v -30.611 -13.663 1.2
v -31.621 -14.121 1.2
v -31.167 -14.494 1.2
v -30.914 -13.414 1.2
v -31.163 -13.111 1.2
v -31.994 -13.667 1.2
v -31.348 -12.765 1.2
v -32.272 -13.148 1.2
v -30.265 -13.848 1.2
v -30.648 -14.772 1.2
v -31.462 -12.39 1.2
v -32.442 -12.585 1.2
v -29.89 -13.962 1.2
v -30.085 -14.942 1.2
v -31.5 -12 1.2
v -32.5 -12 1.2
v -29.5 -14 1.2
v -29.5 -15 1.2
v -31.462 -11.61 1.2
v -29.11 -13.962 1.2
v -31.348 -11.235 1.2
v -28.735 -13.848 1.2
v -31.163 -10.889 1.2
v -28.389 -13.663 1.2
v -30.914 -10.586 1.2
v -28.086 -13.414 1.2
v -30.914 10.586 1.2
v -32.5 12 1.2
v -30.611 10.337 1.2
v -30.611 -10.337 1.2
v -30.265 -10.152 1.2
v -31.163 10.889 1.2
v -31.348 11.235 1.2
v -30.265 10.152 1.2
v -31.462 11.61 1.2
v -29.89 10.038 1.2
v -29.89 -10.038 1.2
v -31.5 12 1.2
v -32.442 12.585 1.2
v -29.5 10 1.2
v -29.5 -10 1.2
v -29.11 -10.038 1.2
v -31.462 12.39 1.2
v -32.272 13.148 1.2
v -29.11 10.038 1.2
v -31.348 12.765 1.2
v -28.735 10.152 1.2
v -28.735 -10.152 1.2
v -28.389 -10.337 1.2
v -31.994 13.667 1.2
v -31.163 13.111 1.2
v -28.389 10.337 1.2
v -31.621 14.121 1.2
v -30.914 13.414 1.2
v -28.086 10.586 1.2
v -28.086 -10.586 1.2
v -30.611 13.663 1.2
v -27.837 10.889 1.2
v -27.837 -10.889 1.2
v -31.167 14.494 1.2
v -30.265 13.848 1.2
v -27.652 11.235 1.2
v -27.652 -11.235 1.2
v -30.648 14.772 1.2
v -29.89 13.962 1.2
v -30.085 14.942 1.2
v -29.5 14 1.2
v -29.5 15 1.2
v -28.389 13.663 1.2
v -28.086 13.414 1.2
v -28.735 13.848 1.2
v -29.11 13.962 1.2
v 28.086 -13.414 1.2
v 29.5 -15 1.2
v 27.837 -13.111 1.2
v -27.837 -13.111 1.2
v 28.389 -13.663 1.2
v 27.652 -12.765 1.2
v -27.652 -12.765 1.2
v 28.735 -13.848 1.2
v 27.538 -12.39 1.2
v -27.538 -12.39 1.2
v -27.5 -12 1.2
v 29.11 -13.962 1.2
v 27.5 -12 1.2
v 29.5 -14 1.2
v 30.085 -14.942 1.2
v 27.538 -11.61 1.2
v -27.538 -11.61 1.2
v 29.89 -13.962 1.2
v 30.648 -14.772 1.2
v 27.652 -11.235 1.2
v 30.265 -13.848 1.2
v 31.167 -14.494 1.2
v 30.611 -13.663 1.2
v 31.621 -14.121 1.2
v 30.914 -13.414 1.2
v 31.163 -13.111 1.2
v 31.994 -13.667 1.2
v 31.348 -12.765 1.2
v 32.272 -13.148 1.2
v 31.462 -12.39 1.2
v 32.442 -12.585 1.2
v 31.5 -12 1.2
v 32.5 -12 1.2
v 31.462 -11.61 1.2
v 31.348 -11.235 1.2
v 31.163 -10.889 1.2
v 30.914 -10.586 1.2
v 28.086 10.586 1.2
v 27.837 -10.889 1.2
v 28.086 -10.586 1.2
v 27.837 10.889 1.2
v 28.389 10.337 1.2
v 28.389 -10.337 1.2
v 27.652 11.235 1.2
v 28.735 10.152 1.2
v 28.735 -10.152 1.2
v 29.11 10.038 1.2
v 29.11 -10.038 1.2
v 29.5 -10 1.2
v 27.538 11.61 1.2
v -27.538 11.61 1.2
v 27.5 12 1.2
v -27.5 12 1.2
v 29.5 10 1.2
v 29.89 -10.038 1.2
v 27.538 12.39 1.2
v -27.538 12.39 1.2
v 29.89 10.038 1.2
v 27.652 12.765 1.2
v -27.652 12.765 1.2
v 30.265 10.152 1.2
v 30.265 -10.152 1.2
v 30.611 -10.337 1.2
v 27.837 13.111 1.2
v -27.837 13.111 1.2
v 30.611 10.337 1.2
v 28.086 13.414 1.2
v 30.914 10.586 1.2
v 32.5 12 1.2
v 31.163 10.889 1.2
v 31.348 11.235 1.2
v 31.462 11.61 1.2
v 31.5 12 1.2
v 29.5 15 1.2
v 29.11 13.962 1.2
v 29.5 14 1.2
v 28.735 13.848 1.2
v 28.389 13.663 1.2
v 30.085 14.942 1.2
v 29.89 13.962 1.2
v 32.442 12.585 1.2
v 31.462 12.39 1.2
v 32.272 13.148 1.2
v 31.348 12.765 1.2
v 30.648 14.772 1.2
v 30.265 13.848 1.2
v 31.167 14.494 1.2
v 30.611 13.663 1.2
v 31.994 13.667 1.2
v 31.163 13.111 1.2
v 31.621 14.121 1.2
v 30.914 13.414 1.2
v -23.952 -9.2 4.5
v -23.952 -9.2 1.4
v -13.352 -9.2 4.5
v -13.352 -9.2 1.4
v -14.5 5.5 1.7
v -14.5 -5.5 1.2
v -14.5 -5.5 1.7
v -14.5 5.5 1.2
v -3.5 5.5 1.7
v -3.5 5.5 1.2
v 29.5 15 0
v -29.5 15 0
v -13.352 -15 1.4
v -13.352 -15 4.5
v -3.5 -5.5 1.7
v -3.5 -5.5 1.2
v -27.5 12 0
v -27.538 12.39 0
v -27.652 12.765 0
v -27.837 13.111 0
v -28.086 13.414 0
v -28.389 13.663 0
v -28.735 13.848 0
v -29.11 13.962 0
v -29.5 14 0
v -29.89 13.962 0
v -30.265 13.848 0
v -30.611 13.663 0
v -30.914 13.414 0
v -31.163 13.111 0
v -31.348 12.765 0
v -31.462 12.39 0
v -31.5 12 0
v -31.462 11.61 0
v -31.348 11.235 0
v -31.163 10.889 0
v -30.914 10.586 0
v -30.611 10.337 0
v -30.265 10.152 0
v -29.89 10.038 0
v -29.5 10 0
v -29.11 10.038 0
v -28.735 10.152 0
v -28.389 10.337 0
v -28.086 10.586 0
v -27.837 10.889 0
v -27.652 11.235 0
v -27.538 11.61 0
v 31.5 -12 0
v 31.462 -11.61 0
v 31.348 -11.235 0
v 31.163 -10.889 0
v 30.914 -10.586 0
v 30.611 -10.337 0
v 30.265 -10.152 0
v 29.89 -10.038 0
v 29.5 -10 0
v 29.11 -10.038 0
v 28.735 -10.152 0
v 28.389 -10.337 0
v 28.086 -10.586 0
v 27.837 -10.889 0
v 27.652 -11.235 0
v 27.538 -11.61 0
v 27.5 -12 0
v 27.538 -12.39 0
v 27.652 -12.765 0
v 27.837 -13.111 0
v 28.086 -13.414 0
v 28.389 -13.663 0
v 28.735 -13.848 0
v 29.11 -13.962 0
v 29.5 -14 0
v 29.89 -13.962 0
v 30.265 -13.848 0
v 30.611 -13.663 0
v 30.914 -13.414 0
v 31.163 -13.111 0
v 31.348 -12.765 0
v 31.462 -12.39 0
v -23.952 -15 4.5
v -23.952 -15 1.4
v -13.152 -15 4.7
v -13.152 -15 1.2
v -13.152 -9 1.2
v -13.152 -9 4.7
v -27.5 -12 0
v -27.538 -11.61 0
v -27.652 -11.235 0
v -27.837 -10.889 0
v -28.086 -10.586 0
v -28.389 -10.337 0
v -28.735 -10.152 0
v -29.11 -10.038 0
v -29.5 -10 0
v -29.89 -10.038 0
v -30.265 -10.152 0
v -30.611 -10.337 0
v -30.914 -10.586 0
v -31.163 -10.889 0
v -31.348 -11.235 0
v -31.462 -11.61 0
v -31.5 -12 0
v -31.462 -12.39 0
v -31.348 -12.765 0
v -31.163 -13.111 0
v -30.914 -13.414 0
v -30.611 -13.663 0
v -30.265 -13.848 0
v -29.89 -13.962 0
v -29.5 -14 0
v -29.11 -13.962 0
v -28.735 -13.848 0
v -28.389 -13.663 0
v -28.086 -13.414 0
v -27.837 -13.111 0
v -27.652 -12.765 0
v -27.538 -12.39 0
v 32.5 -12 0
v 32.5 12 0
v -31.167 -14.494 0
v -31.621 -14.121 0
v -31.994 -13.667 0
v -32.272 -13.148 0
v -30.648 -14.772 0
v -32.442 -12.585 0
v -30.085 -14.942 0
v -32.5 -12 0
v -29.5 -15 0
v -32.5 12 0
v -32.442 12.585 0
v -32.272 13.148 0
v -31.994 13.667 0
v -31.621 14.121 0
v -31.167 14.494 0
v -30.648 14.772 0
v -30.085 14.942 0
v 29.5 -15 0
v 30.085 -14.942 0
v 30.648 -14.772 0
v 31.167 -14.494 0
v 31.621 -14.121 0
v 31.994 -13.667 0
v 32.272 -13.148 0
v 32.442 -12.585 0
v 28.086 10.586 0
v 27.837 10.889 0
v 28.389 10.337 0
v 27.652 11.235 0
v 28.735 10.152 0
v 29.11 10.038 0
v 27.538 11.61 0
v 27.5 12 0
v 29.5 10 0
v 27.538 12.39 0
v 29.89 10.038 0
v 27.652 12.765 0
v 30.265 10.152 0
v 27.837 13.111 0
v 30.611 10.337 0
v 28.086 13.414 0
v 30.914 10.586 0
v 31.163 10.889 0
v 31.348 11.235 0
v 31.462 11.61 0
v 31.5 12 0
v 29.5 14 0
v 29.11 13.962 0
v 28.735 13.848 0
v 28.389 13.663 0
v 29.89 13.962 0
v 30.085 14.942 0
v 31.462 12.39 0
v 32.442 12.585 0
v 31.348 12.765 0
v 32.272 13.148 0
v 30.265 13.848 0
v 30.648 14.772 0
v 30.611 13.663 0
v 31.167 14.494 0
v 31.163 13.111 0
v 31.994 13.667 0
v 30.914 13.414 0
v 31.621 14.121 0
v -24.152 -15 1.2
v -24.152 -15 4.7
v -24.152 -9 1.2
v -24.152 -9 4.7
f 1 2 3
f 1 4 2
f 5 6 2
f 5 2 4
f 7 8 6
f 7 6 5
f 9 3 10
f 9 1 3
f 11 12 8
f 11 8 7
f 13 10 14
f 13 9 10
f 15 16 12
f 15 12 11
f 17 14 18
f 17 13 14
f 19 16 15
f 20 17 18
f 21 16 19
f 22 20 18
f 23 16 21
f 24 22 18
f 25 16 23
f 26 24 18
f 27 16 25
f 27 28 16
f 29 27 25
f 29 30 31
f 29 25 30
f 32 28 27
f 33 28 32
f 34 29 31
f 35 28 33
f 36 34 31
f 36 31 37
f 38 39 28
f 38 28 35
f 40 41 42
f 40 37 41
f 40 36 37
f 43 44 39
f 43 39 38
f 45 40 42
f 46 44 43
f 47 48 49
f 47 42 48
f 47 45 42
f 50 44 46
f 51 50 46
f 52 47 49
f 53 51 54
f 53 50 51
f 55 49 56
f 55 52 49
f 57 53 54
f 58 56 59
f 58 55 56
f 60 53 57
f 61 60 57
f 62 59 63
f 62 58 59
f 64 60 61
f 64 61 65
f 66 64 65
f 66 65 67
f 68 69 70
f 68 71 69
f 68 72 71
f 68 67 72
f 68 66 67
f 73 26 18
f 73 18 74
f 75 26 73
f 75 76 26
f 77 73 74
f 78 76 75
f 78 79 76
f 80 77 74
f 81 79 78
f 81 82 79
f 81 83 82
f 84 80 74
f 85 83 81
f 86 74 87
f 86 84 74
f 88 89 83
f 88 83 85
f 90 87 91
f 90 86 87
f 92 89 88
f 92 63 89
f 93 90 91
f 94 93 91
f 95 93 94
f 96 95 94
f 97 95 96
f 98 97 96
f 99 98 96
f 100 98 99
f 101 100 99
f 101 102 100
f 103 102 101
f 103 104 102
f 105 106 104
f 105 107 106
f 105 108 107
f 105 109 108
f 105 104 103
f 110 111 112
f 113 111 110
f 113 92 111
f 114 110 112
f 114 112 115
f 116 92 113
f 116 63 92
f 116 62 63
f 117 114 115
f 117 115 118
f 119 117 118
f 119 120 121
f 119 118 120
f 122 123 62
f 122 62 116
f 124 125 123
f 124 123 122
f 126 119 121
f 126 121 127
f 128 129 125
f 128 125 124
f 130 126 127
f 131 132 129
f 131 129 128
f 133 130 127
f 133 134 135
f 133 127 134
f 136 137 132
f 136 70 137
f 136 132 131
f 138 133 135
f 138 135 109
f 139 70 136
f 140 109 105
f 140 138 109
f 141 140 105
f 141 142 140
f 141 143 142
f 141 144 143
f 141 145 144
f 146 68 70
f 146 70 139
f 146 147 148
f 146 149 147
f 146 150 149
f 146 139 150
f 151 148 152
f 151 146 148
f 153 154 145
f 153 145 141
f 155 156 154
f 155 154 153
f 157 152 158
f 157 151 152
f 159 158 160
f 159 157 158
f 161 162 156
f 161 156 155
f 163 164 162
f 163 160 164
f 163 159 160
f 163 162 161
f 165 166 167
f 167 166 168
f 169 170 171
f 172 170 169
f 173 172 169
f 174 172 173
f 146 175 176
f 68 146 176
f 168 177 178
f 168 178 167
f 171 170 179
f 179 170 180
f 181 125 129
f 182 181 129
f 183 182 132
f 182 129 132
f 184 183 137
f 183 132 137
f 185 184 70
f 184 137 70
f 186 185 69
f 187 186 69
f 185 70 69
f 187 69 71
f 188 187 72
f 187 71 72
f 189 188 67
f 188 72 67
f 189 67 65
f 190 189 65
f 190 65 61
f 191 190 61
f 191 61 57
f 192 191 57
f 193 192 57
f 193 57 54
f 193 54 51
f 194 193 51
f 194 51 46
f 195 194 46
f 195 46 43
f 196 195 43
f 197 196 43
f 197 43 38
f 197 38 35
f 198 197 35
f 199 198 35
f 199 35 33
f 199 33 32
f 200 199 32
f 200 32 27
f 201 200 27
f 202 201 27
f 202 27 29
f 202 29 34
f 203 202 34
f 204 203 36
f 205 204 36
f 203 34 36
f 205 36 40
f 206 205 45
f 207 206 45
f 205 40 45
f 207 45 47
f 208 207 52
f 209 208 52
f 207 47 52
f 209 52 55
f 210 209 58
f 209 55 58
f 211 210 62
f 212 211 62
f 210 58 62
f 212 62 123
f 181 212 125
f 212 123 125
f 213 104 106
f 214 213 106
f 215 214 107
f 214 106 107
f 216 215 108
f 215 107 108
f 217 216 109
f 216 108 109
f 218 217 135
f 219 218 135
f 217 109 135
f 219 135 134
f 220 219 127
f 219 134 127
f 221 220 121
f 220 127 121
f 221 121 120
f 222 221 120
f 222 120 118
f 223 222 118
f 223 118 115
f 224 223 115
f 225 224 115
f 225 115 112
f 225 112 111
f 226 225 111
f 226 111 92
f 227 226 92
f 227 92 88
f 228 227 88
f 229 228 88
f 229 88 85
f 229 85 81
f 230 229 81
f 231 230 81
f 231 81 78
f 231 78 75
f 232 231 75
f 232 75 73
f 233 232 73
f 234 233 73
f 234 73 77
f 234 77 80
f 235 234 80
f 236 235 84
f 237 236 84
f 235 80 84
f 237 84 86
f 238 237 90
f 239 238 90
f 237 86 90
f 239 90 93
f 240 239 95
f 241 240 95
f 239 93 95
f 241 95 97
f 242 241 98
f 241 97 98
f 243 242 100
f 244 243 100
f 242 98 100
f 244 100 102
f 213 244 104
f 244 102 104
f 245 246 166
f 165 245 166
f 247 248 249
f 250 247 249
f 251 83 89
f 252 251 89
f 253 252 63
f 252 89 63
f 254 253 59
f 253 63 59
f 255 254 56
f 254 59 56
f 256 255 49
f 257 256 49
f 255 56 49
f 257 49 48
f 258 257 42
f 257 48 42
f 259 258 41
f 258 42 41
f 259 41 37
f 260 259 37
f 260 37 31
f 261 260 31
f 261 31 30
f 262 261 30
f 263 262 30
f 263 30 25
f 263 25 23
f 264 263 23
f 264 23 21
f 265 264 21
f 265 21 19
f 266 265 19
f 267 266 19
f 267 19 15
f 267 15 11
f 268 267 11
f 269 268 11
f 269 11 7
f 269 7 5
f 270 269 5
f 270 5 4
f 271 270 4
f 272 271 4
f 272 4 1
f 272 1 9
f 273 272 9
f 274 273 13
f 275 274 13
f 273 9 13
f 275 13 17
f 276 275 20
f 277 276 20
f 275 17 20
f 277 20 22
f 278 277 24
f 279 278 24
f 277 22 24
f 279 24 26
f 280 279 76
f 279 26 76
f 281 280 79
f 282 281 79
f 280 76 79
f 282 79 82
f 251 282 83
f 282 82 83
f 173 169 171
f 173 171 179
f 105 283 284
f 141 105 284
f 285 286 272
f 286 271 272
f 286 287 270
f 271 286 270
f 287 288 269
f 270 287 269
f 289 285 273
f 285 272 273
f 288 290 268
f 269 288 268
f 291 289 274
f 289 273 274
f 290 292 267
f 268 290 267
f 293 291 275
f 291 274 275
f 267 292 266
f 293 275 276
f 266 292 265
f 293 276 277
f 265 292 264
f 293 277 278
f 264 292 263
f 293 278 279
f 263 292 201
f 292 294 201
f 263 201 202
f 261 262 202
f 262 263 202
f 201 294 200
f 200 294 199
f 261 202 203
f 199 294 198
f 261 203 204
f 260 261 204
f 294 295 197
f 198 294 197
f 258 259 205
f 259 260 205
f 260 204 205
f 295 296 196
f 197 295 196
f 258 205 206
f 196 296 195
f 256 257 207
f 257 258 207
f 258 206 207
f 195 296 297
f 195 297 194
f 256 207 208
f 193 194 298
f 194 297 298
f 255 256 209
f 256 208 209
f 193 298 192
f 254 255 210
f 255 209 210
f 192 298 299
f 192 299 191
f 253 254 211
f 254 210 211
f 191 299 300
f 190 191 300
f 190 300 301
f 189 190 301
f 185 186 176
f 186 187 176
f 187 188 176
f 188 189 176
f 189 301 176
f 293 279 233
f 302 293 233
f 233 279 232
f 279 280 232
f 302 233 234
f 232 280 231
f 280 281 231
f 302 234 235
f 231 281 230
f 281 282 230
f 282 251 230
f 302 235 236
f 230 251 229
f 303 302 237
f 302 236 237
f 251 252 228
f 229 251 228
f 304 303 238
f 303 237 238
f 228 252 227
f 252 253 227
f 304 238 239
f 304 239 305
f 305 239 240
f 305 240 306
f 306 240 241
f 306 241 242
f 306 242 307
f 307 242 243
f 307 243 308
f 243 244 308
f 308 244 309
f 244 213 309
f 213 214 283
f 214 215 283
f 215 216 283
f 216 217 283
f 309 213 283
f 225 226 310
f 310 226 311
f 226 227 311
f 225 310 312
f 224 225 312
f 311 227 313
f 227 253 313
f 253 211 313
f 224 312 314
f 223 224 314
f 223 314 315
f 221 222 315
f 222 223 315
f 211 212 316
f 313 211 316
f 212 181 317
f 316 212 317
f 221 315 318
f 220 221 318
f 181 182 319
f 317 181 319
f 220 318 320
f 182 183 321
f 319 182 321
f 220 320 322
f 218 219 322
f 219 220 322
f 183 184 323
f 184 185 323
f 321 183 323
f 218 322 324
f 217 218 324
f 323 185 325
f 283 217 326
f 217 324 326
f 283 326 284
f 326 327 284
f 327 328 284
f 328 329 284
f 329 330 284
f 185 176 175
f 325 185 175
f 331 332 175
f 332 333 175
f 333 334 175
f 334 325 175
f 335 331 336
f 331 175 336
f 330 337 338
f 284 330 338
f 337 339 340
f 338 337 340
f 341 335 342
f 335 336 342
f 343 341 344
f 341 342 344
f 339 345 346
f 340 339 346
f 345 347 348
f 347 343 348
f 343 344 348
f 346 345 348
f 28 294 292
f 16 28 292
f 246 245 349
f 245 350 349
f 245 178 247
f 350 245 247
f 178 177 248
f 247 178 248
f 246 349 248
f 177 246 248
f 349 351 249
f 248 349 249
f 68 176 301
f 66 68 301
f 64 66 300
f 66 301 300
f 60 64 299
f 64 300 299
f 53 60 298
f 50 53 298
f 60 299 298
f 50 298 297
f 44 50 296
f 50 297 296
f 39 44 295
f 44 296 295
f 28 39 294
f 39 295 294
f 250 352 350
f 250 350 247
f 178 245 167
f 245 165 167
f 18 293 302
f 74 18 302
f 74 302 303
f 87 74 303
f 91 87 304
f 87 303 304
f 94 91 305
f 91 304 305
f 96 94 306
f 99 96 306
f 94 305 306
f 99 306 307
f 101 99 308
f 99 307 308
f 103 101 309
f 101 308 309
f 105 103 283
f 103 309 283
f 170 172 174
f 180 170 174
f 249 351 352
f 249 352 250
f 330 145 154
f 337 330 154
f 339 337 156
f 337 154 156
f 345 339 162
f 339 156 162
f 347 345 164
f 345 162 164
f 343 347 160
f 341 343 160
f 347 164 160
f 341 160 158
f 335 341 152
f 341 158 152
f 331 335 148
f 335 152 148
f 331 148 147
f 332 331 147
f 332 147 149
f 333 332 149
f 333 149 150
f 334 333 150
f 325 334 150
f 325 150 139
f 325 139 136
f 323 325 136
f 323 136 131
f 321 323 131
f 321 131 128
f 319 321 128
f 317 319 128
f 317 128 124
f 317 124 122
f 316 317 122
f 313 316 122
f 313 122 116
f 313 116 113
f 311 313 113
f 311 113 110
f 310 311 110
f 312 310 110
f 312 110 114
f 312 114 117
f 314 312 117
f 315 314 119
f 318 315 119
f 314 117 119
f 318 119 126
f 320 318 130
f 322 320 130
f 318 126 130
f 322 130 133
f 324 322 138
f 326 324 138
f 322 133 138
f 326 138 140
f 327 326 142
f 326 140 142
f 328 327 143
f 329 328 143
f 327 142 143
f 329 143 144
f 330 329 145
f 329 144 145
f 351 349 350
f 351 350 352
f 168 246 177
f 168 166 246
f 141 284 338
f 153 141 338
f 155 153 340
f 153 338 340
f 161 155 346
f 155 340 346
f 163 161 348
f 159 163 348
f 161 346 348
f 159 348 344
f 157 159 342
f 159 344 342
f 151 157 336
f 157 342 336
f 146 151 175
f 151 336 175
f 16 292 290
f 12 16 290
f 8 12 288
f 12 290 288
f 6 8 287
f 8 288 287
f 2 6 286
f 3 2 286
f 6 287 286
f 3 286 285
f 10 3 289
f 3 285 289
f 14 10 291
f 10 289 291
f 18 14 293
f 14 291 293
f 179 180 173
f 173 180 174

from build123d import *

# Parameters (mm, degrees)
F1_DEPTH = 1.2
F2_R     = 2
F3_DEPTH = 2
F4_W     = 11
F4_H     = 11
F5_DEPTH = 0.5
F6_W     = 11
F6_H     = 6
F7_DEPTH = 3.5
F8_T     = -0.2


with BuildPart() as f1:
    # F0 (on Top) → F1 (new body)
    with BuildSketch(Plane.XY):
        with BuildLine():
            ThreePointArc((32.5, 12), (31.62132, 14.12132), (29.5, 15))
            Line((29.5, 15), (-29.5, 15))
            ThreePointArc((-29.5, 15), (-31.62132, 14.12132), (-32.5, 12))
            Line((-32.5, 12), (-32.5, -12))
            ThreePointArc((-32.5, -12), (-31.62132, -14.12132), (-29.5, -15))
            Line((-29.5, -15), (29.5, -15))
            ThreePointArc((29.5, -15), (31.62132, -14.12132), (32.5, -12))
            Line((32.5, -12), (32.5, 12))
        make_face()
    extrude(amount=F1_DEPTH)

    # F2 (on face) → F3 (cut)
    with BuildSketch(Plane.XY.offset(1.2)):
        with Locations((-29.5, 12)):
            Circle(F2_R)
        with Locations((29.5, 12)):
            Circle(F2_R)
        with Locations((-29.5, -12)):
            Circle(F2_R)
        with Locations((29.5, -12)):
            Circle(F2_R)
    extrude(amount=-F3_DEPTH, mode=Mode.SUBTRACT)


with BuildPart() as f5:
    # F4 (on face) → F5 (new body)
    with BuildSketch(Plane.XY.offset(1.2)):
        with Locations((-9, 0)):
            Rectangle(F4_W, F4_H)
    extrude(amount=F5_DEPTH)


with BuildPart() as f7:
    # F6 (on face) → F7 (new body)
    with BuildSketch(Plane.XY.offset(1.2)):
        with Locations((-18.651528, -12)):
            Rectangle(F6_W, F6_H)
    extrude(amount=F7_DEPTH)

    # F8
    f8_openings = [f7.faces().sort_by_distance(p)[0] for p in [
        (-18.651528, -15, 2.95),
    ]]
    offset(amount=F8_T, openings=f8_openings)


solid = Compound([f1.part, f5.part, f7.part])
